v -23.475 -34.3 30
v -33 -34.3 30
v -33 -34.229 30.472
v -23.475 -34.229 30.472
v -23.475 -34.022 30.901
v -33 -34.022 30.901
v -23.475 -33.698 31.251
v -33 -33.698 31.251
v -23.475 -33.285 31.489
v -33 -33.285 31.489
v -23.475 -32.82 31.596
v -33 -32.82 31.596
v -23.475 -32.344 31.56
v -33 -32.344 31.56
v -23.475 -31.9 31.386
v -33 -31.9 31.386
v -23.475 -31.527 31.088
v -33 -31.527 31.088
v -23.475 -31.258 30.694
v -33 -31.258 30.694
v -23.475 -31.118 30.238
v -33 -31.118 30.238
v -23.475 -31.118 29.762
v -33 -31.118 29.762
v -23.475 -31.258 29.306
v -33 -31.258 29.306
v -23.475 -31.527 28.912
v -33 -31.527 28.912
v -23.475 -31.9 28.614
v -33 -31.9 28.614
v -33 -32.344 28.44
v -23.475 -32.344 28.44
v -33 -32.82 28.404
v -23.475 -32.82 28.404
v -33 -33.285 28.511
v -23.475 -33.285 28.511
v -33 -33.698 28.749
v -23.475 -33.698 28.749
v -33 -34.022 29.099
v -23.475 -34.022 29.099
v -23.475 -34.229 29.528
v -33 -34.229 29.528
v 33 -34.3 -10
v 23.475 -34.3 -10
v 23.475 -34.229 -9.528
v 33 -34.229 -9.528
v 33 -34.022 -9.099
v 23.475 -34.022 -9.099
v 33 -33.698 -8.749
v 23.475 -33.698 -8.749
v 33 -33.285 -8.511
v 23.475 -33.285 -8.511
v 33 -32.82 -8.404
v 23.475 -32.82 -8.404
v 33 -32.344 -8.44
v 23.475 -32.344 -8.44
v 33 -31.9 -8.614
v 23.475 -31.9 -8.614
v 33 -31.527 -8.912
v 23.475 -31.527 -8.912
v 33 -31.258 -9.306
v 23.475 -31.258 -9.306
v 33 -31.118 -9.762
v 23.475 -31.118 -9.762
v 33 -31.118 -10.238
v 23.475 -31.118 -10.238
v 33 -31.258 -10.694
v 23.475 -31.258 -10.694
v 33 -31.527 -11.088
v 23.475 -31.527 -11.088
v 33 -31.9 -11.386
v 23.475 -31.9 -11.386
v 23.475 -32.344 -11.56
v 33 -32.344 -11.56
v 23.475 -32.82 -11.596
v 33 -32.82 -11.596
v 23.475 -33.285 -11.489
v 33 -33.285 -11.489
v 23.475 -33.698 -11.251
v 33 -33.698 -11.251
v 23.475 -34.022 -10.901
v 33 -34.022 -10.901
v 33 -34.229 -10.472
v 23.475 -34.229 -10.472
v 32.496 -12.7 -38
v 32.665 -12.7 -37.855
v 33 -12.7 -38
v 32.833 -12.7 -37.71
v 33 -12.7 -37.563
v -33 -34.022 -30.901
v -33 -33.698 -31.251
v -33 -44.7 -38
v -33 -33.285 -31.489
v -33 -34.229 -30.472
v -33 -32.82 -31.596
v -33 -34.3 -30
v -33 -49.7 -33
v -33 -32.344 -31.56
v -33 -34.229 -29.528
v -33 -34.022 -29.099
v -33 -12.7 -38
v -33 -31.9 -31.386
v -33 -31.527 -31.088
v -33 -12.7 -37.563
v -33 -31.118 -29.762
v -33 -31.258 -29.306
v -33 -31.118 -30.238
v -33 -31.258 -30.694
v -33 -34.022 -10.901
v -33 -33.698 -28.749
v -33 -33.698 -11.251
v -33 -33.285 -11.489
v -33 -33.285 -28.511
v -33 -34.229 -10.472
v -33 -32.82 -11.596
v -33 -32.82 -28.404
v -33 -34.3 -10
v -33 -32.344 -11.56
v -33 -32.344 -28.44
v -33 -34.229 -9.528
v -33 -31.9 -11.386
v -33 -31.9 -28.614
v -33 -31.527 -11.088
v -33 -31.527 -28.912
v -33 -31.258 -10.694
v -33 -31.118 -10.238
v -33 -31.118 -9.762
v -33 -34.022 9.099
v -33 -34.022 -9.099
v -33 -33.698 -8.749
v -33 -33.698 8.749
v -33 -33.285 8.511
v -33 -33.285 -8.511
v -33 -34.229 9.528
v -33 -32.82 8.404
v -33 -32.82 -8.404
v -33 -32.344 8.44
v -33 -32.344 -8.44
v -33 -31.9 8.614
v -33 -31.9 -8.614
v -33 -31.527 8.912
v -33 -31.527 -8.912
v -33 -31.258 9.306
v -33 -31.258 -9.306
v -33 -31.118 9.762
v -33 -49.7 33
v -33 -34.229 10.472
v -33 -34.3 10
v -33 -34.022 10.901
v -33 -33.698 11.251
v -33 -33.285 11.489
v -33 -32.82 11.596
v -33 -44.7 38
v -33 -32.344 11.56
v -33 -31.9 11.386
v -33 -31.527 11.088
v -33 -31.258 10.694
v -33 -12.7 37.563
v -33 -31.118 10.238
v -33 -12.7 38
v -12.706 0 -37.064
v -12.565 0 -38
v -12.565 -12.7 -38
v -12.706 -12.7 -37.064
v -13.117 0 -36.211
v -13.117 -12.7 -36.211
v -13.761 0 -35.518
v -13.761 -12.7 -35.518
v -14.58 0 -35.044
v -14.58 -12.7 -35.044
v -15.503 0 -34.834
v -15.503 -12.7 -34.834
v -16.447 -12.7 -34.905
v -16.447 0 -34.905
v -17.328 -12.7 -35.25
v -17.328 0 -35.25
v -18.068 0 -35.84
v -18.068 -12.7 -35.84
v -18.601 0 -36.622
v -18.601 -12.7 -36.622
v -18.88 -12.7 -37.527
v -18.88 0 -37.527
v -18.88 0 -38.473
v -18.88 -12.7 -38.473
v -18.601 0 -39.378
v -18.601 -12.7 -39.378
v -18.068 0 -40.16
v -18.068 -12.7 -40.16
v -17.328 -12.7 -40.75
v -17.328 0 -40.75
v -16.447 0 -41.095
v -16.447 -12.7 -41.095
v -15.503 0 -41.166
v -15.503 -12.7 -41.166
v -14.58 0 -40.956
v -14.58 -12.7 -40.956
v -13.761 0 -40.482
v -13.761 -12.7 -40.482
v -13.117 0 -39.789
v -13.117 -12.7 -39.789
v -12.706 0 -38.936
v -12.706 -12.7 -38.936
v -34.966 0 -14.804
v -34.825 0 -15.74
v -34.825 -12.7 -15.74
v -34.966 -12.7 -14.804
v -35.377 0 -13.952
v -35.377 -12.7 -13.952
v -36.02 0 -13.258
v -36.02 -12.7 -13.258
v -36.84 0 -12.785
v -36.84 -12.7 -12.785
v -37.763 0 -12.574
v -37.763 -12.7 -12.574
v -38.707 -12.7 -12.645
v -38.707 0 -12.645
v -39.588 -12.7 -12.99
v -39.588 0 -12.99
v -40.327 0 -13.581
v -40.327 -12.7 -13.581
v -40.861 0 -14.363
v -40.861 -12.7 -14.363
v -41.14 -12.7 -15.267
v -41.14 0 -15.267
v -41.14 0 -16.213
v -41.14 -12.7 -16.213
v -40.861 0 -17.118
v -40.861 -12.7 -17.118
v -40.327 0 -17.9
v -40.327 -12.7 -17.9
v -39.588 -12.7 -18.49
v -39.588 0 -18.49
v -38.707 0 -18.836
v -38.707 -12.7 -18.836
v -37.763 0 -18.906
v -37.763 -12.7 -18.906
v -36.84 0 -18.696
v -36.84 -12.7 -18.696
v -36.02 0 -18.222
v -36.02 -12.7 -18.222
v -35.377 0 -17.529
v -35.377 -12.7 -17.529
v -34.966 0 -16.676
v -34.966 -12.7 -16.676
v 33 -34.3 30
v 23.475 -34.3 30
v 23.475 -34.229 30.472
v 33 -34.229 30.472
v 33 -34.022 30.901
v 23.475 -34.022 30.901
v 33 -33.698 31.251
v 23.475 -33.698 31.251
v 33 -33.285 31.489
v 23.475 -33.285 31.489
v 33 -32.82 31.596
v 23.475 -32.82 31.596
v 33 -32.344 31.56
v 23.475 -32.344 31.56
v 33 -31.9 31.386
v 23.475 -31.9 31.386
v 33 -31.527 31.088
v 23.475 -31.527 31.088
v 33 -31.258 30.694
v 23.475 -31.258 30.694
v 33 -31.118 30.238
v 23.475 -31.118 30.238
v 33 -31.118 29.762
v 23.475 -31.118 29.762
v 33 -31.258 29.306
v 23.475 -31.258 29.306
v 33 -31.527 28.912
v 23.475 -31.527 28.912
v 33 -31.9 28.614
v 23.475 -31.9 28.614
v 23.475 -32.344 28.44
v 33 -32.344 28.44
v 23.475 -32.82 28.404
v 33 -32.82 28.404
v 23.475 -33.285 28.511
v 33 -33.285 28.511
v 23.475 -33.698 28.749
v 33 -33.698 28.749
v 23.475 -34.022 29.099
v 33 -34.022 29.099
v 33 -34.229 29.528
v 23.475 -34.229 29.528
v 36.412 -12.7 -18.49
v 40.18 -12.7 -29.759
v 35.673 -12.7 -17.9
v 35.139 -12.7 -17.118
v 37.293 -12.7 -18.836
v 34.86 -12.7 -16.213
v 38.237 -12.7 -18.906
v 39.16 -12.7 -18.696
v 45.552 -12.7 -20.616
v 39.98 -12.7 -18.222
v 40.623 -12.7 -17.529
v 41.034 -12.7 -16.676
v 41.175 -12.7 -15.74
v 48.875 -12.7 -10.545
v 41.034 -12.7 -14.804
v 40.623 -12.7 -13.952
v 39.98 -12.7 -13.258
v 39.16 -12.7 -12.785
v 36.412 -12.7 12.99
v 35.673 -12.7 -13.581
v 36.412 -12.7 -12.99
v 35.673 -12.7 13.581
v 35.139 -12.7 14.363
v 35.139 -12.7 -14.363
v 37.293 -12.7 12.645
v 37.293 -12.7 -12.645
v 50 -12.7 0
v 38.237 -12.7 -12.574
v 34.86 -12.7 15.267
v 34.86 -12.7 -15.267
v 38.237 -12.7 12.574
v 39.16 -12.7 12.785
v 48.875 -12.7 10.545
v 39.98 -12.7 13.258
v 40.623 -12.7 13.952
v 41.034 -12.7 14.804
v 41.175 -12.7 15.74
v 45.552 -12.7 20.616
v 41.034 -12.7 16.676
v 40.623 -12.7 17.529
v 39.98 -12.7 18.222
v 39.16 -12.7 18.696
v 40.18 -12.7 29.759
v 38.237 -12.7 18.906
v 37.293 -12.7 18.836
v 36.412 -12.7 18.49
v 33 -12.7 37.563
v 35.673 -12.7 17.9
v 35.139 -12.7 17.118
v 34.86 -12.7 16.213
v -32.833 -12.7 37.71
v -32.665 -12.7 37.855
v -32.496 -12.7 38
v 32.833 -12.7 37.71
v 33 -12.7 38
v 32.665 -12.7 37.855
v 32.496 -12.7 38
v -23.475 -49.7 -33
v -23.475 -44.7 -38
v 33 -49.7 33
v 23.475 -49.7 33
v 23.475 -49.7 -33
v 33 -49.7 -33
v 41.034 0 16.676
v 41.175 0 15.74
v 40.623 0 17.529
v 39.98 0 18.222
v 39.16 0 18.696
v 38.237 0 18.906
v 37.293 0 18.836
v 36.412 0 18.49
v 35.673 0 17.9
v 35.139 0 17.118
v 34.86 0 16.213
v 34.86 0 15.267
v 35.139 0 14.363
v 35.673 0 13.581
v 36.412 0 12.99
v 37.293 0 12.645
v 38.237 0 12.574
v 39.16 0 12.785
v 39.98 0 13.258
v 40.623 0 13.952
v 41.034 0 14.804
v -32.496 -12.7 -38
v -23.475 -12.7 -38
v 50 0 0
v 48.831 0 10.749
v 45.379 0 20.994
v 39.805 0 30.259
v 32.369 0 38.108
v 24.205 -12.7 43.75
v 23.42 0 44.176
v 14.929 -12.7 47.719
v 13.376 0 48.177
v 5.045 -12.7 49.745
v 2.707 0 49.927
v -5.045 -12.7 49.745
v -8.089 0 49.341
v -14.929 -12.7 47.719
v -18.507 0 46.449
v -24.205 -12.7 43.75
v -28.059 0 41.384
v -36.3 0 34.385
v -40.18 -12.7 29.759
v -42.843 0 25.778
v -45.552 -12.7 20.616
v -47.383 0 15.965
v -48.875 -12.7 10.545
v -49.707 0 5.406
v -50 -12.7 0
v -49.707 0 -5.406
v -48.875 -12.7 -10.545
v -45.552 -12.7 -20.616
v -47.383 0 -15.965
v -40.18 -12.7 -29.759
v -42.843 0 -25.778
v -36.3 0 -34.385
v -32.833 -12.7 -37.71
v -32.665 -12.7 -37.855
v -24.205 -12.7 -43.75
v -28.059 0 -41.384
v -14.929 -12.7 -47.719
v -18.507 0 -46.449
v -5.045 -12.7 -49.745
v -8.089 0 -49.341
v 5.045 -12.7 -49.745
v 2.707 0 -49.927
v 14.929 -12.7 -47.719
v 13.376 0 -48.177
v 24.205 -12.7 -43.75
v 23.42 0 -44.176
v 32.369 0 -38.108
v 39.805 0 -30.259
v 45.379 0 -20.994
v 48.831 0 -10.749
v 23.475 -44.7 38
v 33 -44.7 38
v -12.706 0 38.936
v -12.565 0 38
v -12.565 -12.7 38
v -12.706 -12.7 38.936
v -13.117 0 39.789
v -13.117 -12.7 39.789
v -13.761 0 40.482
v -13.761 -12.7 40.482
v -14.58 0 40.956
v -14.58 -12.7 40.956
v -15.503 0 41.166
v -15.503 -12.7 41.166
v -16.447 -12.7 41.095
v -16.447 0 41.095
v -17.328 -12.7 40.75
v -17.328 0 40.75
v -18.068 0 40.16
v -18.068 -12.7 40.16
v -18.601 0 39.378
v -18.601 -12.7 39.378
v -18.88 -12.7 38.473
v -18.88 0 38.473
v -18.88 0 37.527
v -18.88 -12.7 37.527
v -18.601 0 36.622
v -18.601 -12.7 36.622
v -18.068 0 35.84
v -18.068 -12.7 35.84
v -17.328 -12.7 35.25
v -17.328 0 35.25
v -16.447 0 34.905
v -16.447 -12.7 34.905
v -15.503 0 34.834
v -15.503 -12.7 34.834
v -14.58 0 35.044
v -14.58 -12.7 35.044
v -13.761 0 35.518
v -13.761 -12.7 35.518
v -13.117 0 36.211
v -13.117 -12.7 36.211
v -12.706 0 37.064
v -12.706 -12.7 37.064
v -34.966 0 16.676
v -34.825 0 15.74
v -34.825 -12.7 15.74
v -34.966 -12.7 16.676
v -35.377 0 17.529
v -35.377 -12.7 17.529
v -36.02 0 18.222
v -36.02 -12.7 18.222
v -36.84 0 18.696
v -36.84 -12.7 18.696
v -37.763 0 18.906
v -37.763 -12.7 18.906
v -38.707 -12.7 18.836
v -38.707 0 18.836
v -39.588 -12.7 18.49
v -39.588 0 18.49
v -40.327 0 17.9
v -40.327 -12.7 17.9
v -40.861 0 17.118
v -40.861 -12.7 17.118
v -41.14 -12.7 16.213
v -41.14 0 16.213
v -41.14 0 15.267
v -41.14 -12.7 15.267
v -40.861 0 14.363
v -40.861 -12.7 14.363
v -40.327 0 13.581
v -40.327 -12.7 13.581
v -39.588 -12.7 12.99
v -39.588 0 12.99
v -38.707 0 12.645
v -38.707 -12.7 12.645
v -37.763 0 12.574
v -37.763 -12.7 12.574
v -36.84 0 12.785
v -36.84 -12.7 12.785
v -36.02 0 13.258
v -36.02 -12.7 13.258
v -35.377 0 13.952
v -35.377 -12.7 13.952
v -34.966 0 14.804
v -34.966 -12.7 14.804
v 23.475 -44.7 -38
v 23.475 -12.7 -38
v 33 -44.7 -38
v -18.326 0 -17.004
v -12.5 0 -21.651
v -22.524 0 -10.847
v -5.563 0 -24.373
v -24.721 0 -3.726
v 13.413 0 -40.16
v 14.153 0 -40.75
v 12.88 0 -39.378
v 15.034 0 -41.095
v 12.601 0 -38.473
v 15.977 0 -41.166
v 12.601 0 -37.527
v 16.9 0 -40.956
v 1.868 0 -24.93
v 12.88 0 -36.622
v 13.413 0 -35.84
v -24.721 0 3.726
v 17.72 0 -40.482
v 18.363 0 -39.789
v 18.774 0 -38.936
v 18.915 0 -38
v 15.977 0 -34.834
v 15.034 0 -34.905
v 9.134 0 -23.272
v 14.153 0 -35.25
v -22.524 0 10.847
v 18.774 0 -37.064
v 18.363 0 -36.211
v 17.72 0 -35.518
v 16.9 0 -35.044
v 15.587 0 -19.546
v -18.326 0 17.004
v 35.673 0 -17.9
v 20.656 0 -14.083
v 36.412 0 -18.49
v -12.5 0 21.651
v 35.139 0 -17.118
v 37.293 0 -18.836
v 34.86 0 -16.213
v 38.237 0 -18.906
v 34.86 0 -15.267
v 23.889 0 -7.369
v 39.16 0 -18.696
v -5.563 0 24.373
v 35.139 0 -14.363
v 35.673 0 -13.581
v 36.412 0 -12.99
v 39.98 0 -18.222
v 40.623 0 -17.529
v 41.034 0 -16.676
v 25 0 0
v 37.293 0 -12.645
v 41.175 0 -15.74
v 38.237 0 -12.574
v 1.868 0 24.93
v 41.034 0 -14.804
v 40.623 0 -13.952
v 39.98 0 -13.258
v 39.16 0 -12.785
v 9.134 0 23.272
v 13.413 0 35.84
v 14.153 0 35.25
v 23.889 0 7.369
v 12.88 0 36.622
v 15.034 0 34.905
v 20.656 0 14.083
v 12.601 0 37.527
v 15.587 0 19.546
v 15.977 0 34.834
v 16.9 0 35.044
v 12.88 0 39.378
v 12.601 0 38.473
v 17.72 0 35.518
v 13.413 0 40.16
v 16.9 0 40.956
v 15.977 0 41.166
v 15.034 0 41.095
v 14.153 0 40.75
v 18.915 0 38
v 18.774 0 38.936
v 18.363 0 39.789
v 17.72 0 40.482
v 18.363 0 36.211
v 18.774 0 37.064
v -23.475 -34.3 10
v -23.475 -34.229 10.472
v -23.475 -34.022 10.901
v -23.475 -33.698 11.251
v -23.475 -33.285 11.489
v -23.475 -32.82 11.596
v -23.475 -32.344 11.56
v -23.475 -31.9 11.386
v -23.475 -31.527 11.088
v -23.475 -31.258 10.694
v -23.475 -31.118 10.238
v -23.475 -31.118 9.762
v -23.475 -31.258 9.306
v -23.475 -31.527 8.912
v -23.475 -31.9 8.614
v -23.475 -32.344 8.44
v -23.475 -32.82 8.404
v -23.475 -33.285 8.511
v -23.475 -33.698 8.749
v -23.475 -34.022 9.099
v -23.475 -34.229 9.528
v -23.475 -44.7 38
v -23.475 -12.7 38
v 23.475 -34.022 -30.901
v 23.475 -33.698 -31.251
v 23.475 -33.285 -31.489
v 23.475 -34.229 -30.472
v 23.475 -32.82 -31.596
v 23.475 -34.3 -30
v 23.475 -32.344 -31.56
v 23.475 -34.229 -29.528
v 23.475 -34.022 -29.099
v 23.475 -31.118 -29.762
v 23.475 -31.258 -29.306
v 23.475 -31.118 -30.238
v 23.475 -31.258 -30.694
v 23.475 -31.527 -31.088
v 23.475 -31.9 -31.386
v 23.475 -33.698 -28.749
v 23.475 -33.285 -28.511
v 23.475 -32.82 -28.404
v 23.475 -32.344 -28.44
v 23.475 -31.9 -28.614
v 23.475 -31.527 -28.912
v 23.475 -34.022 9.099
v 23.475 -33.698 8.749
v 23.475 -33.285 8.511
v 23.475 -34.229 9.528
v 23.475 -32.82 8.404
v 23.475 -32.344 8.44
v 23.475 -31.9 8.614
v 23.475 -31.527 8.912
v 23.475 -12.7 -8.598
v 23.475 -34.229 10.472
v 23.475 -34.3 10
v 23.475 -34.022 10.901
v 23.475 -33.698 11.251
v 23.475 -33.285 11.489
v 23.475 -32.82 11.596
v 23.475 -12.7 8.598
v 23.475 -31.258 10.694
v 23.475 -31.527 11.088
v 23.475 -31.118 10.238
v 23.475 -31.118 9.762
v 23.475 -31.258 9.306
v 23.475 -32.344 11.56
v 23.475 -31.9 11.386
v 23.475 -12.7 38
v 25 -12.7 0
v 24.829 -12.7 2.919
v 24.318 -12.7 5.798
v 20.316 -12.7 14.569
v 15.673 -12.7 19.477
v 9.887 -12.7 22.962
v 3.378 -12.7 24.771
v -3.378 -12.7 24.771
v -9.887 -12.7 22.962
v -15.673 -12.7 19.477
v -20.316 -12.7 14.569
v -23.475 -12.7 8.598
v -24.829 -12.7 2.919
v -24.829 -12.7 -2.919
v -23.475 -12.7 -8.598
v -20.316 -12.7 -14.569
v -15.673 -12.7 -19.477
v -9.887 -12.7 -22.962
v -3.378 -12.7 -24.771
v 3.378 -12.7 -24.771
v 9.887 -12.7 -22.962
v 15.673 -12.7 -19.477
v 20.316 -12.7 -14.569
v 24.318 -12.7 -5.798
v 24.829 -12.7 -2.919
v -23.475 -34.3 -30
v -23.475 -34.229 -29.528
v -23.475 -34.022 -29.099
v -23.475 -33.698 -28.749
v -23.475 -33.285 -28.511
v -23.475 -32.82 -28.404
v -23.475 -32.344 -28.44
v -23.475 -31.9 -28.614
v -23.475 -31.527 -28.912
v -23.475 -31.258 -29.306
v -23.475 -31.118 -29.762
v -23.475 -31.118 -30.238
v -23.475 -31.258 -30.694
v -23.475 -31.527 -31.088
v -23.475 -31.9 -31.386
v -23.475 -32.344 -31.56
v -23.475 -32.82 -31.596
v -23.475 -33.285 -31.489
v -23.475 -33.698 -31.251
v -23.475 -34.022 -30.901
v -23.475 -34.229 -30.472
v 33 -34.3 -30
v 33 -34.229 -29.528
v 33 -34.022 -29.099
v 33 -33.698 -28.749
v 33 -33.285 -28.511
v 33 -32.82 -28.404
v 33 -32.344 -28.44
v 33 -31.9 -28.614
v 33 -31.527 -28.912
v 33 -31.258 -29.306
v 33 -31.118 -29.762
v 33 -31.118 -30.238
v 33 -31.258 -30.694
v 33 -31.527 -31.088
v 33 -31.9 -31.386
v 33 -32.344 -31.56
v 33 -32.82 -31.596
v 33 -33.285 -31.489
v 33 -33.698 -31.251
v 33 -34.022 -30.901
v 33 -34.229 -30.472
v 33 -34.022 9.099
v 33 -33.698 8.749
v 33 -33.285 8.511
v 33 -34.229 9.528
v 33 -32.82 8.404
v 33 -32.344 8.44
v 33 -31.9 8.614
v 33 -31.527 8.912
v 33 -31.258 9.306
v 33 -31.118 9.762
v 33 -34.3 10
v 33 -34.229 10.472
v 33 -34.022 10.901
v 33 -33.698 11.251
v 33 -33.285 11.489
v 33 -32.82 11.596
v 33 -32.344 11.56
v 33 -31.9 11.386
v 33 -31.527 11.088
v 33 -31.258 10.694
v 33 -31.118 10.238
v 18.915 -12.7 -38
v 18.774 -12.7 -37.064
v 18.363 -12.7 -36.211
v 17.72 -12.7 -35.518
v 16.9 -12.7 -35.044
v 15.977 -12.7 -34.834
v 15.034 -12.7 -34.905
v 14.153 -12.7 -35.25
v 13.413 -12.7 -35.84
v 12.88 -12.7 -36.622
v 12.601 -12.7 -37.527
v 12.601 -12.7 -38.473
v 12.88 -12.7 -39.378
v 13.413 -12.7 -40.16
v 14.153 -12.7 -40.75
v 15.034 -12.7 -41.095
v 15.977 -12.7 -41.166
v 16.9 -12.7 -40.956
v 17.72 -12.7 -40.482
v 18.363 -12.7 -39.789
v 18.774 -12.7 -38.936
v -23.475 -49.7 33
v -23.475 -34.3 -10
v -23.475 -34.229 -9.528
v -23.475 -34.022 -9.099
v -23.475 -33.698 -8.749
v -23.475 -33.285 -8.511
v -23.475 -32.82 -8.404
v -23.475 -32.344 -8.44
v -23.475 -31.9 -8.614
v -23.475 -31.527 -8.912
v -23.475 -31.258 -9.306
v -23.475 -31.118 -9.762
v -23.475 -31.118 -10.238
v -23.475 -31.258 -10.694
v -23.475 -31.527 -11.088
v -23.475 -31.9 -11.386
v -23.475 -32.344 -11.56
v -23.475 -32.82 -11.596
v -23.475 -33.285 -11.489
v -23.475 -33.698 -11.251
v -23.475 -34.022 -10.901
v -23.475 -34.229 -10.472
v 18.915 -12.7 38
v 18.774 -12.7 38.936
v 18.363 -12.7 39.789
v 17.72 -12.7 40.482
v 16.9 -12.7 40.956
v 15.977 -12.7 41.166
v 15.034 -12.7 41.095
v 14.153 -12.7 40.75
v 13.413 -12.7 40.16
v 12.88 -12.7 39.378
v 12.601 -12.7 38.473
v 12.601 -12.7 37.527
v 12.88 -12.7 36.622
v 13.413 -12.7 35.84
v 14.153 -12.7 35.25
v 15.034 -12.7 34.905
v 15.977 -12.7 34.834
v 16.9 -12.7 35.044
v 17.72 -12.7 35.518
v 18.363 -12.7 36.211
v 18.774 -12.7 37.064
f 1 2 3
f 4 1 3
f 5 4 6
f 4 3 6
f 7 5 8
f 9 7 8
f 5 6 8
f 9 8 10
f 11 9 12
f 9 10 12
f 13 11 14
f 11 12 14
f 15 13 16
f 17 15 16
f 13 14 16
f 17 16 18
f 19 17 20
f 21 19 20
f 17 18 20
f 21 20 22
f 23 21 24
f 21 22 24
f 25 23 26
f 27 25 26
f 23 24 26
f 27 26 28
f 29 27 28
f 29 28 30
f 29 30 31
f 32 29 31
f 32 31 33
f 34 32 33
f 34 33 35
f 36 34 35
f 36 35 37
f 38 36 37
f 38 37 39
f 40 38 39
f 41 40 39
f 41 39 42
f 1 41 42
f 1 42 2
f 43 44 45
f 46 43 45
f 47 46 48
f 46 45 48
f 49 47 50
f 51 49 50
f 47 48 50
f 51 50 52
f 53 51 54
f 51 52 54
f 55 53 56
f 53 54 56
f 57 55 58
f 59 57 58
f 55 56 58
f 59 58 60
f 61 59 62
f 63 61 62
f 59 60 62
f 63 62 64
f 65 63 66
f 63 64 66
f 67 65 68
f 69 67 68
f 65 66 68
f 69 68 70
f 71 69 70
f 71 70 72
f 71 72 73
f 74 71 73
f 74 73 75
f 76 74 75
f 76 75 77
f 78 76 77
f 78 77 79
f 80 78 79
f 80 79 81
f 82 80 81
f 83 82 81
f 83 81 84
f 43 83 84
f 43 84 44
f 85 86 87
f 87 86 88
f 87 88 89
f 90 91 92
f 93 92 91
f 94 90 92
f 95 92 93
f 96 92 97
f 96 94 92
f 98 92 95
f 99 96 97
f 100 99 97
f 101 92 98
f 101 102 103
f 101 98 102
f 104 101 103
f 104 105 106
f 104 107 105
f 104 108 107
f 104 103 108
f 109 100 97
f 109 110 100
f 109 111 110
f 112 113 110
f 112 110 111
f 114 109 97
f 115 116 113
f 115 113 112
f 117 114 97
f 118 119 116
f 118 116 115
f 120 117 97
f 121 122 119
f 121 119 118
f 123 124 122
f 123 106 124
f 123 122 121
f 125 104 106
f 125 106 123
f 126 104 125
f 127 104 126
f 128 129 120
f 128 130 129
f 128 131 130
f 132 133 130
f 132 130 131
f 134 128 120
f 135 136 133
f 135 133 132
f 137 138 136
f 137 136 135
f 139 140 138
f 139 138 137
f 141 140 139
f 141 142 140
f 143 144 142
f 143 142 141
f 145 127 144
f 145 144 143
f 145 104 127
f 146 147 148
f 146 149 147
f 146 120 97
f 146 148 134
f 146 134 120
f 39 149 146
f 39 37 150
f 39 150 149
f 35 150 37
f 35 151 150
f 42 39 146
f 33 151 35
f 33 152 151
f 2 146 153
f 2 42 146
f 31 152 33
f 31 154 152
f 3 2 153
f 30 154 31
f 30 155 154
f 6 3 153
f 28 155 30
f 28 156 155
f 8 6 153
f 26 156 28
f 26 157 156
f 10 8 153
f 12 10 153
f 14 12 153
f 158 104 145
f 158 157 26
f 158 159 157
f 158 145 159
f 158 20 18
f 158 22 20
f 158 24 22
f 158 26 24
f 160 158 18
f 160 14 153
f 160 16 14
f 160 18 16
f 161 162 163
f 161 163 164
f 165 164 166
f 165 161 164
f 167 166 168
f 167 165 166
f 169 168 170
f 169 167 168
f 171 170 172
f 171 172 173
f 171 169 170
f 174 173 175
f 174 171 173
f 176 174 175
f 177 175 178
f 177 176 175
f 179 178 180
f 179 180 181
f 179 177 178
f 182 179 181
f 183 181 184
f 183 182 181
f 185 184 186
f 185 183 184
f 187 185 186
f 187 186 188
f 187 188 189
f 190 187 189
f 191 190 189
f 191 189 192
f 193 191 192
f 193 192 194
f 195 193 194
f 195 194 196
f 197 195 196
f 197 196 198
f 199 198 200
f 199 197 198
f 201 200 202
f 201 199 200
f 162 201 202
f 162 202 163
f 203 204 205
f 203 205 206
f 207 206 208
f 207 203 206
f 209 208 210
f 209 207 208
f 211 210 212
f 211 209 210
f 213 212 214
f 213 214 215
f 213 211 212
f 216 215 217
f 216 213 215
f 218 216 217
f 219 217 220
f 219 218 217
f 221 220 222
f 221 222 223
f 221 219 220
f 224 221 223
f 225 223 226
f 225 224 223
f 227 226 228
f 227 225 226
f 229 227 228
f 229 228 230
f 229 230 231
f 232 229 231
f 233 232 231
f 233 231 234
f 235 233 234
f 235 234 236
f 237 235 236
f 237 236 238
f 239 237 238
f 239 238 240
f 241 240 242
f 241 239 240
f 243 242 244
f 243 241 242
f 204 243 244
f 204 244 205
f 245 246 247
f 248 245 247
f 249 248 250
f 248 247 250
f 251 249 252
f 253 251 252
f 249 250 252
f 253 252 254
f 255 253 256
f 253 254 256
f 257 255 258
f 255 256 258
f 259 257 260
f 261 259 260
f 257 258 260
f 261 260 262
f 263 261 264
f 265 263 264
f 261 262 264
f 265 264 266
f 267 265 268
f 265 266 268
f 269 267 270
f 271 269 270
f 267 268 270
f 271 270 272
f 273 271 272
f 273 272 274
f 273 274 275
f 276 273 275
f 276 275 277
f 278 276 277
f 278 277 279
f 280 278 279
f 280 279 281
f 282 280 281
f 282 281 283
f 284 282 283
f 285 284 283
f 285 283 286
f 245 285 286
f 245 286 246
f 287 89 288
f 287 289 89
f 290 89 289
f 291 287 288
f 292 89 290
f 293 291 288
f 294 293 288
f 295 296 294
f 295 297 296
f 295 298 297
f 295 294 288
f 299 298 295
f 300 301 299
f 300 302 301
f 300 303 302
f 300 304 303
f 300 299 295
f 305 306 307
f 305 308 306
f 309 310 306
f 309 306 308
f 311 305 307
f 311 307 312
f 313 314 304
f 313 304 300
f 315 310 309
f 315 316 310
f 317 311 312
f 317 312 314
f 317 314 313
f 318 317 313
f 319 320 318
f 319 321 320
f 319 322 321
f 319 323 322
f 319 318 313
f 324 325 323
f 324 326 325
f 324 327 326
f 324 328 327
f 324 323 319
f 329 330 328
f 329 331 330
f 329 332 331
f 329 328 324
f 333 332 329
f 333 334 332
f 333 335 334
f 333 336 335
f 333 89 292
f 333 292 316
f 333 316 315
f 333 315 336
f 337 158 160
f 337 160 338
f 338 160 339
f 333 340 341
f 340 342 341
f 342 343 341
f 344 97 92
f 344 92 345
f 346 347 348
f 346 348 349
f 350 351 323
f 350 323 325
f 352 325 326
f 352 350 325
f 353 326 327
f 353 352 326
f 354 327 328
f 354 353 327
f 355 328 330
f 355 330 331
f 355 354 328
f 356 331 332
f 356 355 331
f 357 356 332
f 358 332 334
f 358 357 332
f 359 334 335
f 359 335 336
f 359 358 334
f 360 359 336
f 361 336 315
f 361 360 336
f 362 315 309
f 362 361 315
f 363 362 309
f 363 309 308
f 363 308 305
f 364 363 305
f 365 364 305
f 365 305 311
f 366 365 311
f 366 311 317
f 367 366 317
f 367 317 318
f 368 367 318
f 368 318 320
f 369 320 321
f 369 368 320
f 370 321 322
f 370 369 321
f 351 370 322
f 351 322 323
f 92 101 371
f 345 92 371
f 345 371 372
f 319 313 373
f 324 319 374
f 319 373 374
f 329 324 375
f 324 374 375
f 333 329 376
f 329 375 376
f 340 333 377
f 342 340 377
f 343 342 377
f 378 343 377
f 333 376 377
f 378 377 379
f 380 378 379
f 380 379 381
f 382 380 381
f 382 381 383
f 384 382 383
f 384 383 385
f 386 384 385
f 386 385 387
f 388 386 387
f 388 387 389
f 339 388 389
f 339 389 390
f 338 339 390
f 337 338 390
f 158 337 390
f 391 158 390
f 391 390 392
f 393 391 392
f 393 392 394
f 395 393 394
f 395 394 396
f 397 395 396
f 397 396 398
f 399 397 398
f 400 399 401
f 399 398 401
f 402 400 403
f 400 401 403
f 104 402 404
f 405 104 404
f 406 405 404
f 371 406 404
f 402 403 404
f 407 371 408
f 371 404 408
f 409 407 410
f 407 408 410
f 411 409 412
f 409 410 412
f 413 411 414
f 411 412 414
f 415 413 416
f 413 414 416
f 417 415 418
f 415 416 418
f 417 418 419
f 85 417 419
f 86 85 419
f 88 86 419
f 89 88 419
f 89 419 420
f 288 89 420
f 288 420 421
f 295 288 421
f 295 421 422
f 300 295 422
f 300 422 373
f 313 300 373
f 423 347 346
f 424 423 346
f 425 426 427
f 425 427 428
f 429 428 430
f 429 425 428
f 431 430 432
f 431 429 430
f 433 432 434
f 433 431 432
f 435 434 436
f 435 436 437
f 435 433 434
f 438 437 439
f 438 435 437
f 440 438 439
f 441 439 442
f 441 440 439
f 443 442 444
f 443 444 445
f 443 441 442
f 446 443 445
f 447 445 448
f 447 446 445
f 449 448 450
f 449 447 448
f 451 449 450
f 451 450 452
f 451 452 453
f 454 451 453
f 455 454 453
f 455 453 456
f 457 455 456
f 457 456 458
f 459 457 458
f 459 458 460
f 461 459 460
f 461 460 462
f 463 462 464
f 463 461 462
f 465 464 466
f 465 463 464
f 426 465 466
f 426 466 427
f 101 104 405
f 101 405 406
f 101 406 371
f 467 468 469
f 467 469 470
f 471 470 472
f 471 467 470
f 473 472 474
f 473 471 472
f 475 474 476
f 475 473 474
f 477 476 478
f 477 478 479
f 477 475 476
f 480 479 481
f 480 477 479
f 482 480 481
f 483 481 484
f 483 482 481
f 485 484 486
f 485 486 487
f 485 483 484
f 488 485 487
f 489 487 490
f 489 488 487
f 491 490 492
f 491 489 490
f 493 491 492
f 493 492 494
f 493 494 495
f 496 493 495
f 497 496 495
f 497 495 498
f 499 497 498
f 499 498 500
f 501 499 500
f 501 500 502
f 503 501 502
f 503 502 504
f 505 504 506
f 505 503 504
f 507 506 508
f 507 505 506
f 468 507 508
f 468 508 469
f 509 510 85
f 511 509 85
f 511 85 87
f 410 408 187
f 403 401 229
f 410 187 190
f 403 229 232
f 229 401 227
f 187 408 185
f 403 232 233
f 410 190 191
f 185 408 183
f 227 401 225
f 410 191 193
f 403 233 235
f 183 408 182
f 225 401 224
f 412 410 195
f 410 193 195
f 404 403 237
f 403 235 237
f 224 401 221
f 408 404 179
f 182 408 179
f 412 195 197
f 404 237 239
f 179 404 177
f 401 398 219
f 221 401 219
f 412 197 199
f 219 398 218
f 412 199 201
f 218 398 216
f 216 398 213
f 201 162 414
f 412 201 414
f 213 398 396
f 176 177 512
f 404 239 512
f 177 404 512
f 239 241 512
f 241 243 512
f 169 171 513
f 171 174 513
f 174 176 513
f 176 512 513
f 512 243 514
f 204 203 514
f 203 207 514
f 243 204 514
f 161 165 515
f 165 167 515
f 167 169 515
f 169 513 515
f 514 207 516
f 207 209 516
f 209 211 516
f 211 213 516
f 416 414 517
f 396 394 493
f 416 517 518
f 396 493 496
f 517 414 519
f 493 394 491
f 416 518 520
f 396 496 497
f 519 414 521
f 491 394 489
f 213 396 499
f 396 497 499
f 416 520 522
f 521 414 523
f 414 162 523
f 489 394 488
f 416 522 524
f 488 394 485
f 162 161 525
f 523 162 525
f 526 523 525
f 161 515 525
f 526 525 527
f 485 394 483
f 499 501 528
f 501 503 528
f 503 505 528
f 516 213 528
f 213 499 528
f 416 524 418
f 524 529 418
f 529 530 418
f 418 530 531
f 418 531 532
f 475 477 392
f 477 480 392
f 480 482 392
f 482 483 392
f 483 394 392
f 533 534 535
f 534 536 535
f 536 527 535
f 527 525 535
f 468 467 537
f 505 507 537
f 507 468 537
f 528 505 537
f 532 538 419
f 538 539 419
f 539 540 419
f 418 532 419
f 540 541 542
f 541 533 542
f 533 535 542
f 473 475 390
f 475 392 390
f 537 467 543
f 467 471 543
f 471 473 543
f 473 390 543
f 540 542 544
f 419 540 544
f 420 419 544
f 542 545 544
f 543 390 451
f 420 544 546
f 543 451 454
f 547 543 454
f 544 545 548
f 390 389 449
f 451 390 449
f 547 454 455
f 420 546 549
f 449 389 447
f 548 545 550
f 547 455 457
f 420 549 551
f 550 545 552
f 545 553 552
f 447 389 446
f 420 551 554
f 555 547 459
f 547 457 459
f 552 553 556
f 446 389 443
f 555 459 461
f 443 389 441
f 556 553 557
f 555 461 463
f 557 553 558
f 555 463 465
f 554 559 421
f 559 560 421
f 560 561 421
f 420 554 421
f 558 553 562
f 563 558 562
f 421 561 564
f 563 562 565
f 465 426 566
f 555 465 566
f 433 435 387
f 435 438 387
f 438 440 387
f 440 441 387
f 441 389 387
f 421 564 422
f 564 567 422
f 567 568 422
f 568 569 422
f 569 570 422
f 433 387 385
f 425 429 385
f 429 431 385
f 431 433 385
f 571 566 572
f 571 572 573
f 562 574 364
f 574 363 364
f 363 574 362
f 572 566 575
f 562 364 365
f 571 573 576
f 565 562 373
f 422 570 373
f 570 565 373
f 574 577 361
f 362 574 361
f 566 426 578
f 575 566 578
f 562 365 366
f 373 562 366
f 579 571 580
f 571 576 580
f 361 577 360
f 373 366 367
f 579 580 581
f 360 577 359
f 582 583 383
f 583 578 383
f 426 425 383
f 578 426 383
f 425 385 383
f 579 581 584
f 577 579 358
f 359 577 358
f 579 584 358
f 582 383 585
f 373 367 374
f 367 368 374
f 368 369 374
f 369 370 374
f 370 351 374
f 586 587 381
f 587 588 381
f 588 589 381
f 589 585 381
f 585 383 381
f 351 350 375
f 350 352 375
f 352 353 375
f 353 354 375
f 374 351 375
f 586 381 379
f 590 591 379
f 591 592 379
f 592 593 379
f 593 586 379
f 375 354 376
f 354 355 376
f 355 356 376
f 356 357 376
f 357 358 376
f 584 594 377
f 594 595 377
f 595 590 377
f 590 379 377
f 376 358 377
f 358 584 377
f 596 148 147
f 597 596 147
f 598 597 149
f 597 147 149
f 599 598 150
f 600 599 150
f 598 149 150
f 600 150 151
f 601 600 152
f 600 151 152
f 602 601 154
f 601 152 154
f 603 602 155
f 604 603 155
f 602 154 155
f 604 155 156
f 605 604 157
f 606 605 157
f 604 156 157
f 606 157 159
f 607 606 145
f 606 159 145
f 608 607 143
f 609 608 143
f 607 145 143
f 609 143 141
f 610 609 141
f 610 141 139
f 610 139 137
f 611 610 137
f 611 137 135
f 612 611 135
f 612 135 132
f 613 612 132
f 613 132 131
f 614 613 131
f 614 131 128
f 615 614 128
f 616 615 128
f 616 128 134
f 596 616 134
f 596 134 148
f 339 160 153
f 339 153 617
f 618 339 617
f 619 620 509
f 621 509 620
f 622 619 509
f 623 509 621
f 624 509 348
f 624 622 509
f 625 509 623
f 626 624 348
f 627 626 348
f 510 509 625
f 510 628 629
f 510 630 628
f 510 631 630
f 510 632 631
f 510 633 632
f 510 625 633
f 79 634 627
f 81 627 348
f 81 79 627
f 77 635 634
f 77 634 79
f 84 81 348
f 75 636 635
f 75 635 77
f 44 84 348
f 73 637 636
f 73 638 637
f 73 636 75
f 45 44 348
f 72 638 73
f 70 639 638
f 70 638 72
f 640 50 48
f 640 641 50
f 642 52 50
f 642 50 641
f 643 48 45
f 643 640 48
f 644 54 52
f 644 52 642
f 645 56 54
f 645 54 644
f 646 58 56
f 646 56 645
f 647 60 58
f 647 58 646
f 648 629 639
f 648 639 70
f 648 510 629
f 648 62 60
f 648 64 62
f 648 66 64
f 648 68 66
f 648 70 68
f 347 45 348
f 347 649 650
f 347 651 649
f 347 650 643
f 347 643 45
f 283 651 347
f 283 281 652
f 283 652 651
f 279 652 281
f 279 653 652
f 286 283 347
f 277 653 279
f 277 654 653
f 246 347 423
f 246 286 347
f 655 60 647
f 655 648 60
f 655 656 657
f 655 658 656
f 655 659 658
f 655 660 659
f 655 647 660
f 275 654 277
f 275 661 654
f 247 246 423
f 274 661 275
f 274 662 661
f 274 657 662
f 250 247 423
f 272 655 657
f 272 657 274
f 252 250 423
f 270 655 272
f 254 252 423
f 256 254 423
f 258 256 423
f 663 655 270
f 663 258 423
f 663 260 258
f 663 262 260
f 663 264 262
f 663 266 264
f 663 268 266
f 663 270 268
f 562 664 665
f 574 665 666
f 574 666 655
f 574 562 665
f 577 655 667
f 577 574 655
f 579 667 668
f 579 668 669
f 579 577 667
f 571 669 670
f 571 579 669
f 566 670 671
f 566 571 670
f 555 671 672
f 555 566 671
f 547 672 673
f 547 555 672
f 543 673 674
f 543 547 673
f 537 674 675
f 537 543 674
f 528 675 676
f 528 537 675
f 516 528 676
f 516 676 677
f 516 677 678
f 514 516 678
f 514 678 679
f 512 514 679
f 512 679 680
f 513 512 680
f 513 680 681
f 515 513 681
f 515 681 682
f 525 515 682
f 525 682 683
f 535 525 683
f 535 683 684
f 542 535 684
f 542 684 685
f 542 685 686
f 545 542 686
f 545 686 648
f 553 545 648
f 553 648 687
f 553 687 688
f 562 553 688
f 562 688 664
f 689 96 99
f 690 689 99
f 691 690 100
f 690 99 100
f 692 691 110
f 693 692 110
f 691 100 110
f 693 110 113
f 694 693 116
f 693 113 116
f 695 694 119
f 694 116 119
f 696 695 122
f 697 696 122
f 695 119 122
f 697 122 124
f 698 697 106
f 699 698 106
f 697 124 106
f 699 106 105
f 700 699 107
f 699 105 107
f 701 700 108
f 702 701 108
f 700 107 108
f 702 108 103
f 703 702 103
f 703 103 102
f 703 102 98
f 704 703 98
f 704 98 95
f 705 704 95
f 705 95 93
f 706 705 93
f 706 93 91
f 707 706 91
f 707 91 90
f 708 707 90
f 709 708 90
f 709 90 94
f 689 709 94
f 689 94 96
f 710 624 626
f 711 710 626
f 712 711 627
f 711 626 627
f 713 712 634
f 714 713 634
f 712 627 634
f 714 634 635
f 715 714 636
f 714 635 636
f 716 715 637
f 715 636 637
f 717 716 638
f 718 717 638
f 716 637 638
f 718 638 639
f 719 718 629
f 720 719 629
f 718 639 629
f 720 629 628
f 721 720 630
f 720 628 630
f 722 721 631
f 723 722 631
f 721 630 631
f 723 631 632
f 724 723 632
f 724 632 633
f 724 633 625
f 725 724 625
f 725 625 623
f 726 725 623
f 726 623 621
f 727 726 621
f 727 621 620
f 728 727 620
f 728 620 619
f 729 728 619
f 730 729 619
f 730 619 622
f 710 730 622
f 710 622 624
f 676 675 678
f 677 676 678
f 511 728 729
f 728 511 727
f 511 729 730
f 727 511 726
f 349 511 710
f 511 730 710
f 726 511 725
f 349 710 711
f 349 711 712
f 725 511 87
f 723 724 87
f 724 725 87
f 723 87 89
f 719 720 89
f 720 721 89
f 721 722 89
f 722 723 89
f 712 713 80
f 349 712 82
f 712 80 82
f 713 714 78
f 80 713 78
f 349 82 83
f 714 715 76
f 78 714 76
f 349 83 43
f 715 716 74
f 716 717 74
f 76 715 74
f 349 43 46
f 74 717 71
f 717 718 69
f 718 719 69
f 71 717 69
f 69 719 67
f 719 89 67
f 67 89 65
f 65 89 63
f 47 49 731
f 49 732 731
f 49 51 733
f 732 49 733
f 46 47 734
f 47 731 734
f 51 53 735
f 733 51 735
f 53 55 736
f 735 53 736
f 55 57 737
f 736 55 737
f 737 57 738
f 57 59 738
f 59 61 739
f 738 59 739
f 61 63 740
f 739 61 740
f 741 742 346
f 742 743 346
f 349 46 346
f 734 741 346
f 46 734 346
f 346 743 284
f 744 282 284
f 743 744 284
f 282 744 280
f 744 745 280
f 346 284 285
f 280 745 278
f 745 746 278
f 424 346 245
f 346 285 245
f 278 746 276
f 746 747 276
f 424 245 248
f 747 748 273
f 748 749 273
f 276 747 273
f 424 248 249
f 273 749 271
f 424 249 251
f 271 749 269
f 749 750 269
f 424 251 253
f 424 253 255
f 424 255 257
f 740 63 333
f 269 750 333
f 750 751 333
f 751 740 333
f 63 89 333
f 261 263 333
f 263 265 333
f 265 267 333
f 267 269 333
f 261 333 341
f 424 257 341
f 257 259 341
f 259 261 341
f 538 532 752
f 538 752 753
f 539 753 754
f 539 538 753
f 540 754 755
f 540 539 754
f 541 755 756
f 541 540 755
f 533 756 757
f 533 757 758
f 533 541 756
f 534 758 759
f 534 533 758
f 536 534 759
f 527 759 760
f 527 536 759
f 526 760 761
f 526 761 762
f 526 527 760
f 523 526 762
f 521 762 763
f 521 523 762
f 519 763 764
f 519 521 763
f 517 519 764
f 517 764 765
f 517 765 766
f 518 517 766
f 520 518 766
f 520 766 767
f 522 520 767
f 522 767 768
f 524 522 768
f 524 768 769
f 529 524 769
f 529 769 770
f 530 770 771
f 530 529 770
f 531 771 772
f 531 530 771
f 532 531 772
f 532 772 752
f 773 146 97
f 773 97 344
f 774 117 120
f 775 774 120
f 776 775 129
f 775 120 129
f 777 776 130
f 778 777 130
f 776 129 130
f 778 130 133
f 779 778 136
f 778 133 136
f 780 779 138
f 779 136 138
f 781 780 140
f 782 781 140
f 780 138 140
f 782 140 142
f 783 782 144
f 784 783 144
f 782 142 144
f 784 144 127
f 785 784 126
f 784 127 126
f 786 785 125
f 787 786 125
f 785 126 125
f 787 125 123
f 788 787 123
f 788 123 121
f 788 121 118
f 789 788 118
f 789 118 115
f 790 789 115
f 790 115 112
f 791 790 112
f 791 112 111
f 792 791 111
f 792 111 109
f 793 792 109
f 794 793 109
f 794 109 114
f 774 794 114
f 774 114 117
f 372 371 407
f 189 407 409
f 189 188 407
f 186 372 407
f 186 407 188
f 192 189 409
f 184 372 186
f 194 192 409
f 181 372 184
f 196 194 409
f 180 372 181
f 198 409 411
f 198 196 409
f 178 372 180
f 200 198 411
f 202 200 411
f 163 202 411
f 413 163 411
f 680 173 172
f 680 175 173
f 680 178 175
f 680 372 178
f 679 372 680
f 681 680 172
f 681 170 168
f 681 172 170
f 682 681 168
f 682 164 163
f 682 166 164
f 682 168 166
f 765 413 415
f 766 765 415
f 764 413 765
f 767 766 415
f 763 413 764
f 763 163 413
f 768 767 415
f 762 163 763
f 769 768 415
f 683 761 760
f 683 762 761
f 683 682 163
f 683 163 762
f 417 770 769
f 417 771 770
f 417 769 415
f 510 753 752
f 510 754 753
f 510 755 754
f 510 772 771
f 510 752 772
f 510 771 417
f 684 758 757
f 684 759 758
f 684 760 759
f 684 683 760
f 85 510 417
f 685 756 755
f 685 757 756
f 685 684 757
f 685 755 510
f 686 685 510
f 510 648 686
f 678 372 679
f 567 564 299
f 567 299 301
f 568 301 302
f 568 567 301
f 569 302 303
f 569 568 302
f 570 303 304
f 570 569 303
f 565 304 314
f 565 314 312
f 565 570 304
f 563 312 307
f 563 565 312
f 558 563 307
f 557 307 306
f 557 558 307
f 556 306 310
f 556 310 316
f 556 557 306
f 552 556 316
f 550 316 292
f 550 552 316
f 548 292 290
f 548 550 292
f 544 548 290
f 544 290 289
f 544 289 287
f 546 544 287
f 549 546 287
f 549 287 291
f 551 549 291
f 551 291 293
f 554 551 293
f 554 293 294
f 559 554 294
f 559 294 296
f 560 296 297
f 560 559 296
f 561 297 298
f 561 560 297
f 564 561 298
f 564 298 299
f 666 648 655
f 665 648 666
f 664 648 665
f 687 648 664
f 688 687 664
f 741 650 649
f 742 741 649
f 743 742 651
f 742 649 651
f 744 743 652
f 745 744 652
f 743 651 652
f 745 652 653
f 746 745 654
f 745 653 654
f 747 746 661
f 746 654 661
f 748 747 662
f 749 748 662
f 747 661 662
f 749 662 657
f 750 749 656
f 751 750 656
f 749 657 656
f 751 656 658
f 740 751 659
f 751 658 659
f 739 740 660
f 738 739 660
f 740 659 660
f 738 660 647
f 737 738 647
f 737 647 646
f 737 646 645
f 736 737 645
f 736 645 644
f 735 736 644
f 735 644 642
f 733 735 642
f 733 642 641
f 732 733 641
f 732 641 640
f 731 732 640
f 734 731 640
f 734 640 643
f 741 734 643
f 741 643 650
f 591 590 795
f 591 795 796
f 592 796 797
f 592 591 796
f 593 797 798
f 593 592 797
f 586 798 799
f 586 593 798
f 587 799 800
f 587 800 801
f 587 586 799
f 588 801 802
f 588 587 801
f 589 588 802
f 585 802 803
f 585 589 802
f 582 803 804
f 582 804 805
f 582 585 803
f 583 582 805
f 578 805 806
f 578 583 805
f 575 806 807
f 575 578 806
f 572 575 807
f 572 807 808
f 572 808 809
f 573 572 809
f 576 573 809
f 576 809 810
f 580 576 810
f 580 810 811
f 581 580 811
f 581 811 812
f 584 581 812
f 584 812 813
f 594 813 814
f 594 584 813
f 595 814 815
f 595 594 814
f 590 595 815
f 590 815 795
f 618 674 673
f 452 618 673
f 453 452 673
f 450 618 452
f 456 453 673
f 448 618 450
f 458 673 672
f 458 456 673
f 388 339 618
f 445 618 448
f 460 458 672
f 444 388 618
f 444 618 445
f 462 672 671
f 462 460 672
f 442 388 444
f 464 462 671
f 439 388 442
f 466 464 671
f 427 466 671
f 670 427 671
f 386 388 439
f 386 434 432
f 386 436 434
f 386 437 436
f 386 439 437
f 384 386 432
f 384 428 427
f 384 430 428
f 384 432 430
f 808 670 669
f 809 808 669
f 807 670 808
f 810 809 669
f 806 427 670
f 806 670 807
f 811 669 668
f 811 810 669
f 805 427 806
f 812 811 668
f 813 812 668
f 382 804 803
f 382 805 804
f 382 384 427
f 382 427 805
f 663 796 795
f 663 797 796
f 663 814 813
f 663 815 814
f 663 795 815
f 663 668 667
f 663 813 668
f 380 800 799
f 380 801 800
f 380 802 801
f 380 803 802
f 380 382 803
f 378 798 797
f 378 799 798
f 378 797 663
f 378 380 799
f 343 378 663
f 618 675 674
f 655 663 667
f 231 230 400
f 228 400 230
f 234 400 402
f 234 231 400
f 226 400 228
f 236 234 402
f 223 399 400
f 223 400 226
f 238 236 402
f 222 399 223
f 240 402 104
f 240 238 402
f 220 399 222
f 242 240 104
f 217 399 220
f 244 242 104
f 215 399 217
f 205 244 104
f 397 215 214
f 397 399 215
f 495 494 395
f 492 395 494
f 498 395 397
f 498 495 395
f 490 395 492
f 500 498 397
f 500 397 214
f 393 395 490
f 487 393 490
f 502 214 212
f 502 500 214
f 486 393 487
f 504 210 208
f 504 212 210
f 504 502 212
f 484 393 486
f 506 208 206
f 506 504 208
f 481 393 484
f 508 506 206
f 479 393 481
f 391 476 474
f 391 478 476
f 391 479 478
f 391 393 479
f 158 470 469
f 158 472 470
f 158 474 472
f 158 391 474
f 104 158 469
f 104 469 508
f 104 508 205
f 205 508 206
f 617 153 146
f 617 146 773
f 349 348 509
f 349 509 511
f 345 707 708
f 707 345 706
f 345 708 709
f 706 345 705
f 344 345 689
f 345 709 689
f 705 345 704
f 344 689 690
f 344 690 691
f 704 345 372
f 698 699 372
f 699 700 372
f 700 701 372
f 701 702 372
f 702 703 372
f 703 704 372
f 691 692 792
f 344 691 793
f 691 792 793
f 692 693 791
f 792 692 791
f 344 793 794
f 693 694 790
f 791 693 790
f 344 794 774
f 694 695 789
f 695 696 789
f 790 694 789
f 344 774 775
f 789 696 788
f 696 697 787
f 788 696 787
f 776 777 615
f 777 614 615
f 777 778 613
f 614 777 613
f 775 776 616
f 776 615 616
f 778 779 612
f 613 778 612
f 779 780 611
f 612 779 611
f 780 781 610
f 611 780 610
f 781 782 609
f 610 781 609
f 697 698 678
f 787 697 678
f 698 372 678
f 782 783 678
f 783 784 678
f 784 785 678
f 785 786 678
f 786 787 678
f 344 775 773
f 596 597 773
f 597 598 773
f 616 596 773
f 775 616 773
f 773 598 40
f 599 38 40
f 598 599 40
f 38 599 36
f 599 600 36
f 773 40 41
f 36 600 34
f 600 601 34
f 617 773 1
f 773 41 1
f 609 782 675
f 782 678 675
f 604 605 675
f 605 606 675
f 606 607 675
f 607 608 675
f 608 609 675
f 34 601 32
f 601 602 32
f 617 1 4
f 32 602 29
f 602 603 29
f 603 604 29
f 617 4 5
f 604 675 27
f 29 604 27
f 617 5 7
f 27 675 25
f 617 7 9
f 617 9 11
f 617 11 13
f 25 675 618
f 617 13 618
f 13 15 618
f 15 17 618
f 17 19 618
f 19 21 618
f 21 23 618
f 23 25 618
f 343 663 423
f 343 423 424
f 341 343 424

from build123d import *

# Parameters (mm, degrees)
F0_R     = 50
F0_R_2   = 3.175
F0_R_3   = 25
F1_DEPTH = 12.7
F2_W     = 9.525
F2_H     = 76
F3_DEPTH = 37
F4_R     = 1.6
F5_DEPTH = 83.001
F6_SIZE  = 5


# Not quite as in the source:
# - a feature names something its author has since deleted; it is built from what else it names


with BuildPart() as f1:
    # F0 (on Front) → F1 (new body)
    with BuildSketch(Plane.XZ):
        Circle(F0_R)
        with Locations((-15.7401153702, -38)):
            Circle(F0_R_2, mode=Mode.SUBTRACT)
        with Locations((-38, -15.7401153702)):
            Circle(F0_R_2, mode=Mode.SUBTRACT)
        with Locations((15.7401153702, -38)):
            Circle(F0_R_2, mode=Mode.SUBTRACT)
        with Locations((38, -15.7401153702)):
            Circle(F0_R_2, mode=Mode.SUBTRACT)
        with Locations((-38, 15.7401153702)):
            Circle(F0_R_2, mode=Mode.SUBTRACT)
        with Locations((-15.7401153702, 38)):
            Circle(F0_R_2, mode=Mode.SUBTRACT)
        Circle(F0_R_3, mode=Mode.SUBTRACT)
        with Locations((38, 15.7401153702)):
            Circle(F0_R_2, mode=Mode.SUBTRACT)
        with Locations((15.7401153702, 38)):
            Circle(F0_R_2, mode=Mode.SUBTRACT)
    extrude(amount=F1_DEPTH)

    # F2 (on face) → F3 (join)
    with BuildSketch(Plane.XZ.offset(12.7)):
        with Locations((-28.2375, 0)):
            Rectangle(F2_W, F2_H)
        with Locations((28.2375, 0)):
            Rectangle(F2_W, F2_H)
    extrude(amount=F3_DEPTH)

    # F4 (on face) → F5 (cut, through all)
    with BuildSketch(Plane(origin=(-33, 0, 0), x_dir=(0, -1, 0), z_dir=(-1, 0, 0))):
        with Locations((32.7, 30)):
            Circle(F4_R)
        with Locations((32.7, 10)):
            Circle(F4_R)
        with Locations((32.7, -10)):
            Circle(F4_R)
        with Locations((32.7, -30)):
            Circle(F4_R)
    extrude(amount=-F5_DEPTH, mode=Mode.SUBTRACT)

    # F6
    f6_edges = [f1.edges().sort_by_distance(p)[0] for p in [
        (-28.2375, -49.7, -38),
        (28.2375, -49.7, -38),
        (-28.2375, -49.7, 38),
        (28.2375, -49.7, 38),
    ]]
    chamfer(f6_edges, length=F6_SIZE)


solid = f1.part
